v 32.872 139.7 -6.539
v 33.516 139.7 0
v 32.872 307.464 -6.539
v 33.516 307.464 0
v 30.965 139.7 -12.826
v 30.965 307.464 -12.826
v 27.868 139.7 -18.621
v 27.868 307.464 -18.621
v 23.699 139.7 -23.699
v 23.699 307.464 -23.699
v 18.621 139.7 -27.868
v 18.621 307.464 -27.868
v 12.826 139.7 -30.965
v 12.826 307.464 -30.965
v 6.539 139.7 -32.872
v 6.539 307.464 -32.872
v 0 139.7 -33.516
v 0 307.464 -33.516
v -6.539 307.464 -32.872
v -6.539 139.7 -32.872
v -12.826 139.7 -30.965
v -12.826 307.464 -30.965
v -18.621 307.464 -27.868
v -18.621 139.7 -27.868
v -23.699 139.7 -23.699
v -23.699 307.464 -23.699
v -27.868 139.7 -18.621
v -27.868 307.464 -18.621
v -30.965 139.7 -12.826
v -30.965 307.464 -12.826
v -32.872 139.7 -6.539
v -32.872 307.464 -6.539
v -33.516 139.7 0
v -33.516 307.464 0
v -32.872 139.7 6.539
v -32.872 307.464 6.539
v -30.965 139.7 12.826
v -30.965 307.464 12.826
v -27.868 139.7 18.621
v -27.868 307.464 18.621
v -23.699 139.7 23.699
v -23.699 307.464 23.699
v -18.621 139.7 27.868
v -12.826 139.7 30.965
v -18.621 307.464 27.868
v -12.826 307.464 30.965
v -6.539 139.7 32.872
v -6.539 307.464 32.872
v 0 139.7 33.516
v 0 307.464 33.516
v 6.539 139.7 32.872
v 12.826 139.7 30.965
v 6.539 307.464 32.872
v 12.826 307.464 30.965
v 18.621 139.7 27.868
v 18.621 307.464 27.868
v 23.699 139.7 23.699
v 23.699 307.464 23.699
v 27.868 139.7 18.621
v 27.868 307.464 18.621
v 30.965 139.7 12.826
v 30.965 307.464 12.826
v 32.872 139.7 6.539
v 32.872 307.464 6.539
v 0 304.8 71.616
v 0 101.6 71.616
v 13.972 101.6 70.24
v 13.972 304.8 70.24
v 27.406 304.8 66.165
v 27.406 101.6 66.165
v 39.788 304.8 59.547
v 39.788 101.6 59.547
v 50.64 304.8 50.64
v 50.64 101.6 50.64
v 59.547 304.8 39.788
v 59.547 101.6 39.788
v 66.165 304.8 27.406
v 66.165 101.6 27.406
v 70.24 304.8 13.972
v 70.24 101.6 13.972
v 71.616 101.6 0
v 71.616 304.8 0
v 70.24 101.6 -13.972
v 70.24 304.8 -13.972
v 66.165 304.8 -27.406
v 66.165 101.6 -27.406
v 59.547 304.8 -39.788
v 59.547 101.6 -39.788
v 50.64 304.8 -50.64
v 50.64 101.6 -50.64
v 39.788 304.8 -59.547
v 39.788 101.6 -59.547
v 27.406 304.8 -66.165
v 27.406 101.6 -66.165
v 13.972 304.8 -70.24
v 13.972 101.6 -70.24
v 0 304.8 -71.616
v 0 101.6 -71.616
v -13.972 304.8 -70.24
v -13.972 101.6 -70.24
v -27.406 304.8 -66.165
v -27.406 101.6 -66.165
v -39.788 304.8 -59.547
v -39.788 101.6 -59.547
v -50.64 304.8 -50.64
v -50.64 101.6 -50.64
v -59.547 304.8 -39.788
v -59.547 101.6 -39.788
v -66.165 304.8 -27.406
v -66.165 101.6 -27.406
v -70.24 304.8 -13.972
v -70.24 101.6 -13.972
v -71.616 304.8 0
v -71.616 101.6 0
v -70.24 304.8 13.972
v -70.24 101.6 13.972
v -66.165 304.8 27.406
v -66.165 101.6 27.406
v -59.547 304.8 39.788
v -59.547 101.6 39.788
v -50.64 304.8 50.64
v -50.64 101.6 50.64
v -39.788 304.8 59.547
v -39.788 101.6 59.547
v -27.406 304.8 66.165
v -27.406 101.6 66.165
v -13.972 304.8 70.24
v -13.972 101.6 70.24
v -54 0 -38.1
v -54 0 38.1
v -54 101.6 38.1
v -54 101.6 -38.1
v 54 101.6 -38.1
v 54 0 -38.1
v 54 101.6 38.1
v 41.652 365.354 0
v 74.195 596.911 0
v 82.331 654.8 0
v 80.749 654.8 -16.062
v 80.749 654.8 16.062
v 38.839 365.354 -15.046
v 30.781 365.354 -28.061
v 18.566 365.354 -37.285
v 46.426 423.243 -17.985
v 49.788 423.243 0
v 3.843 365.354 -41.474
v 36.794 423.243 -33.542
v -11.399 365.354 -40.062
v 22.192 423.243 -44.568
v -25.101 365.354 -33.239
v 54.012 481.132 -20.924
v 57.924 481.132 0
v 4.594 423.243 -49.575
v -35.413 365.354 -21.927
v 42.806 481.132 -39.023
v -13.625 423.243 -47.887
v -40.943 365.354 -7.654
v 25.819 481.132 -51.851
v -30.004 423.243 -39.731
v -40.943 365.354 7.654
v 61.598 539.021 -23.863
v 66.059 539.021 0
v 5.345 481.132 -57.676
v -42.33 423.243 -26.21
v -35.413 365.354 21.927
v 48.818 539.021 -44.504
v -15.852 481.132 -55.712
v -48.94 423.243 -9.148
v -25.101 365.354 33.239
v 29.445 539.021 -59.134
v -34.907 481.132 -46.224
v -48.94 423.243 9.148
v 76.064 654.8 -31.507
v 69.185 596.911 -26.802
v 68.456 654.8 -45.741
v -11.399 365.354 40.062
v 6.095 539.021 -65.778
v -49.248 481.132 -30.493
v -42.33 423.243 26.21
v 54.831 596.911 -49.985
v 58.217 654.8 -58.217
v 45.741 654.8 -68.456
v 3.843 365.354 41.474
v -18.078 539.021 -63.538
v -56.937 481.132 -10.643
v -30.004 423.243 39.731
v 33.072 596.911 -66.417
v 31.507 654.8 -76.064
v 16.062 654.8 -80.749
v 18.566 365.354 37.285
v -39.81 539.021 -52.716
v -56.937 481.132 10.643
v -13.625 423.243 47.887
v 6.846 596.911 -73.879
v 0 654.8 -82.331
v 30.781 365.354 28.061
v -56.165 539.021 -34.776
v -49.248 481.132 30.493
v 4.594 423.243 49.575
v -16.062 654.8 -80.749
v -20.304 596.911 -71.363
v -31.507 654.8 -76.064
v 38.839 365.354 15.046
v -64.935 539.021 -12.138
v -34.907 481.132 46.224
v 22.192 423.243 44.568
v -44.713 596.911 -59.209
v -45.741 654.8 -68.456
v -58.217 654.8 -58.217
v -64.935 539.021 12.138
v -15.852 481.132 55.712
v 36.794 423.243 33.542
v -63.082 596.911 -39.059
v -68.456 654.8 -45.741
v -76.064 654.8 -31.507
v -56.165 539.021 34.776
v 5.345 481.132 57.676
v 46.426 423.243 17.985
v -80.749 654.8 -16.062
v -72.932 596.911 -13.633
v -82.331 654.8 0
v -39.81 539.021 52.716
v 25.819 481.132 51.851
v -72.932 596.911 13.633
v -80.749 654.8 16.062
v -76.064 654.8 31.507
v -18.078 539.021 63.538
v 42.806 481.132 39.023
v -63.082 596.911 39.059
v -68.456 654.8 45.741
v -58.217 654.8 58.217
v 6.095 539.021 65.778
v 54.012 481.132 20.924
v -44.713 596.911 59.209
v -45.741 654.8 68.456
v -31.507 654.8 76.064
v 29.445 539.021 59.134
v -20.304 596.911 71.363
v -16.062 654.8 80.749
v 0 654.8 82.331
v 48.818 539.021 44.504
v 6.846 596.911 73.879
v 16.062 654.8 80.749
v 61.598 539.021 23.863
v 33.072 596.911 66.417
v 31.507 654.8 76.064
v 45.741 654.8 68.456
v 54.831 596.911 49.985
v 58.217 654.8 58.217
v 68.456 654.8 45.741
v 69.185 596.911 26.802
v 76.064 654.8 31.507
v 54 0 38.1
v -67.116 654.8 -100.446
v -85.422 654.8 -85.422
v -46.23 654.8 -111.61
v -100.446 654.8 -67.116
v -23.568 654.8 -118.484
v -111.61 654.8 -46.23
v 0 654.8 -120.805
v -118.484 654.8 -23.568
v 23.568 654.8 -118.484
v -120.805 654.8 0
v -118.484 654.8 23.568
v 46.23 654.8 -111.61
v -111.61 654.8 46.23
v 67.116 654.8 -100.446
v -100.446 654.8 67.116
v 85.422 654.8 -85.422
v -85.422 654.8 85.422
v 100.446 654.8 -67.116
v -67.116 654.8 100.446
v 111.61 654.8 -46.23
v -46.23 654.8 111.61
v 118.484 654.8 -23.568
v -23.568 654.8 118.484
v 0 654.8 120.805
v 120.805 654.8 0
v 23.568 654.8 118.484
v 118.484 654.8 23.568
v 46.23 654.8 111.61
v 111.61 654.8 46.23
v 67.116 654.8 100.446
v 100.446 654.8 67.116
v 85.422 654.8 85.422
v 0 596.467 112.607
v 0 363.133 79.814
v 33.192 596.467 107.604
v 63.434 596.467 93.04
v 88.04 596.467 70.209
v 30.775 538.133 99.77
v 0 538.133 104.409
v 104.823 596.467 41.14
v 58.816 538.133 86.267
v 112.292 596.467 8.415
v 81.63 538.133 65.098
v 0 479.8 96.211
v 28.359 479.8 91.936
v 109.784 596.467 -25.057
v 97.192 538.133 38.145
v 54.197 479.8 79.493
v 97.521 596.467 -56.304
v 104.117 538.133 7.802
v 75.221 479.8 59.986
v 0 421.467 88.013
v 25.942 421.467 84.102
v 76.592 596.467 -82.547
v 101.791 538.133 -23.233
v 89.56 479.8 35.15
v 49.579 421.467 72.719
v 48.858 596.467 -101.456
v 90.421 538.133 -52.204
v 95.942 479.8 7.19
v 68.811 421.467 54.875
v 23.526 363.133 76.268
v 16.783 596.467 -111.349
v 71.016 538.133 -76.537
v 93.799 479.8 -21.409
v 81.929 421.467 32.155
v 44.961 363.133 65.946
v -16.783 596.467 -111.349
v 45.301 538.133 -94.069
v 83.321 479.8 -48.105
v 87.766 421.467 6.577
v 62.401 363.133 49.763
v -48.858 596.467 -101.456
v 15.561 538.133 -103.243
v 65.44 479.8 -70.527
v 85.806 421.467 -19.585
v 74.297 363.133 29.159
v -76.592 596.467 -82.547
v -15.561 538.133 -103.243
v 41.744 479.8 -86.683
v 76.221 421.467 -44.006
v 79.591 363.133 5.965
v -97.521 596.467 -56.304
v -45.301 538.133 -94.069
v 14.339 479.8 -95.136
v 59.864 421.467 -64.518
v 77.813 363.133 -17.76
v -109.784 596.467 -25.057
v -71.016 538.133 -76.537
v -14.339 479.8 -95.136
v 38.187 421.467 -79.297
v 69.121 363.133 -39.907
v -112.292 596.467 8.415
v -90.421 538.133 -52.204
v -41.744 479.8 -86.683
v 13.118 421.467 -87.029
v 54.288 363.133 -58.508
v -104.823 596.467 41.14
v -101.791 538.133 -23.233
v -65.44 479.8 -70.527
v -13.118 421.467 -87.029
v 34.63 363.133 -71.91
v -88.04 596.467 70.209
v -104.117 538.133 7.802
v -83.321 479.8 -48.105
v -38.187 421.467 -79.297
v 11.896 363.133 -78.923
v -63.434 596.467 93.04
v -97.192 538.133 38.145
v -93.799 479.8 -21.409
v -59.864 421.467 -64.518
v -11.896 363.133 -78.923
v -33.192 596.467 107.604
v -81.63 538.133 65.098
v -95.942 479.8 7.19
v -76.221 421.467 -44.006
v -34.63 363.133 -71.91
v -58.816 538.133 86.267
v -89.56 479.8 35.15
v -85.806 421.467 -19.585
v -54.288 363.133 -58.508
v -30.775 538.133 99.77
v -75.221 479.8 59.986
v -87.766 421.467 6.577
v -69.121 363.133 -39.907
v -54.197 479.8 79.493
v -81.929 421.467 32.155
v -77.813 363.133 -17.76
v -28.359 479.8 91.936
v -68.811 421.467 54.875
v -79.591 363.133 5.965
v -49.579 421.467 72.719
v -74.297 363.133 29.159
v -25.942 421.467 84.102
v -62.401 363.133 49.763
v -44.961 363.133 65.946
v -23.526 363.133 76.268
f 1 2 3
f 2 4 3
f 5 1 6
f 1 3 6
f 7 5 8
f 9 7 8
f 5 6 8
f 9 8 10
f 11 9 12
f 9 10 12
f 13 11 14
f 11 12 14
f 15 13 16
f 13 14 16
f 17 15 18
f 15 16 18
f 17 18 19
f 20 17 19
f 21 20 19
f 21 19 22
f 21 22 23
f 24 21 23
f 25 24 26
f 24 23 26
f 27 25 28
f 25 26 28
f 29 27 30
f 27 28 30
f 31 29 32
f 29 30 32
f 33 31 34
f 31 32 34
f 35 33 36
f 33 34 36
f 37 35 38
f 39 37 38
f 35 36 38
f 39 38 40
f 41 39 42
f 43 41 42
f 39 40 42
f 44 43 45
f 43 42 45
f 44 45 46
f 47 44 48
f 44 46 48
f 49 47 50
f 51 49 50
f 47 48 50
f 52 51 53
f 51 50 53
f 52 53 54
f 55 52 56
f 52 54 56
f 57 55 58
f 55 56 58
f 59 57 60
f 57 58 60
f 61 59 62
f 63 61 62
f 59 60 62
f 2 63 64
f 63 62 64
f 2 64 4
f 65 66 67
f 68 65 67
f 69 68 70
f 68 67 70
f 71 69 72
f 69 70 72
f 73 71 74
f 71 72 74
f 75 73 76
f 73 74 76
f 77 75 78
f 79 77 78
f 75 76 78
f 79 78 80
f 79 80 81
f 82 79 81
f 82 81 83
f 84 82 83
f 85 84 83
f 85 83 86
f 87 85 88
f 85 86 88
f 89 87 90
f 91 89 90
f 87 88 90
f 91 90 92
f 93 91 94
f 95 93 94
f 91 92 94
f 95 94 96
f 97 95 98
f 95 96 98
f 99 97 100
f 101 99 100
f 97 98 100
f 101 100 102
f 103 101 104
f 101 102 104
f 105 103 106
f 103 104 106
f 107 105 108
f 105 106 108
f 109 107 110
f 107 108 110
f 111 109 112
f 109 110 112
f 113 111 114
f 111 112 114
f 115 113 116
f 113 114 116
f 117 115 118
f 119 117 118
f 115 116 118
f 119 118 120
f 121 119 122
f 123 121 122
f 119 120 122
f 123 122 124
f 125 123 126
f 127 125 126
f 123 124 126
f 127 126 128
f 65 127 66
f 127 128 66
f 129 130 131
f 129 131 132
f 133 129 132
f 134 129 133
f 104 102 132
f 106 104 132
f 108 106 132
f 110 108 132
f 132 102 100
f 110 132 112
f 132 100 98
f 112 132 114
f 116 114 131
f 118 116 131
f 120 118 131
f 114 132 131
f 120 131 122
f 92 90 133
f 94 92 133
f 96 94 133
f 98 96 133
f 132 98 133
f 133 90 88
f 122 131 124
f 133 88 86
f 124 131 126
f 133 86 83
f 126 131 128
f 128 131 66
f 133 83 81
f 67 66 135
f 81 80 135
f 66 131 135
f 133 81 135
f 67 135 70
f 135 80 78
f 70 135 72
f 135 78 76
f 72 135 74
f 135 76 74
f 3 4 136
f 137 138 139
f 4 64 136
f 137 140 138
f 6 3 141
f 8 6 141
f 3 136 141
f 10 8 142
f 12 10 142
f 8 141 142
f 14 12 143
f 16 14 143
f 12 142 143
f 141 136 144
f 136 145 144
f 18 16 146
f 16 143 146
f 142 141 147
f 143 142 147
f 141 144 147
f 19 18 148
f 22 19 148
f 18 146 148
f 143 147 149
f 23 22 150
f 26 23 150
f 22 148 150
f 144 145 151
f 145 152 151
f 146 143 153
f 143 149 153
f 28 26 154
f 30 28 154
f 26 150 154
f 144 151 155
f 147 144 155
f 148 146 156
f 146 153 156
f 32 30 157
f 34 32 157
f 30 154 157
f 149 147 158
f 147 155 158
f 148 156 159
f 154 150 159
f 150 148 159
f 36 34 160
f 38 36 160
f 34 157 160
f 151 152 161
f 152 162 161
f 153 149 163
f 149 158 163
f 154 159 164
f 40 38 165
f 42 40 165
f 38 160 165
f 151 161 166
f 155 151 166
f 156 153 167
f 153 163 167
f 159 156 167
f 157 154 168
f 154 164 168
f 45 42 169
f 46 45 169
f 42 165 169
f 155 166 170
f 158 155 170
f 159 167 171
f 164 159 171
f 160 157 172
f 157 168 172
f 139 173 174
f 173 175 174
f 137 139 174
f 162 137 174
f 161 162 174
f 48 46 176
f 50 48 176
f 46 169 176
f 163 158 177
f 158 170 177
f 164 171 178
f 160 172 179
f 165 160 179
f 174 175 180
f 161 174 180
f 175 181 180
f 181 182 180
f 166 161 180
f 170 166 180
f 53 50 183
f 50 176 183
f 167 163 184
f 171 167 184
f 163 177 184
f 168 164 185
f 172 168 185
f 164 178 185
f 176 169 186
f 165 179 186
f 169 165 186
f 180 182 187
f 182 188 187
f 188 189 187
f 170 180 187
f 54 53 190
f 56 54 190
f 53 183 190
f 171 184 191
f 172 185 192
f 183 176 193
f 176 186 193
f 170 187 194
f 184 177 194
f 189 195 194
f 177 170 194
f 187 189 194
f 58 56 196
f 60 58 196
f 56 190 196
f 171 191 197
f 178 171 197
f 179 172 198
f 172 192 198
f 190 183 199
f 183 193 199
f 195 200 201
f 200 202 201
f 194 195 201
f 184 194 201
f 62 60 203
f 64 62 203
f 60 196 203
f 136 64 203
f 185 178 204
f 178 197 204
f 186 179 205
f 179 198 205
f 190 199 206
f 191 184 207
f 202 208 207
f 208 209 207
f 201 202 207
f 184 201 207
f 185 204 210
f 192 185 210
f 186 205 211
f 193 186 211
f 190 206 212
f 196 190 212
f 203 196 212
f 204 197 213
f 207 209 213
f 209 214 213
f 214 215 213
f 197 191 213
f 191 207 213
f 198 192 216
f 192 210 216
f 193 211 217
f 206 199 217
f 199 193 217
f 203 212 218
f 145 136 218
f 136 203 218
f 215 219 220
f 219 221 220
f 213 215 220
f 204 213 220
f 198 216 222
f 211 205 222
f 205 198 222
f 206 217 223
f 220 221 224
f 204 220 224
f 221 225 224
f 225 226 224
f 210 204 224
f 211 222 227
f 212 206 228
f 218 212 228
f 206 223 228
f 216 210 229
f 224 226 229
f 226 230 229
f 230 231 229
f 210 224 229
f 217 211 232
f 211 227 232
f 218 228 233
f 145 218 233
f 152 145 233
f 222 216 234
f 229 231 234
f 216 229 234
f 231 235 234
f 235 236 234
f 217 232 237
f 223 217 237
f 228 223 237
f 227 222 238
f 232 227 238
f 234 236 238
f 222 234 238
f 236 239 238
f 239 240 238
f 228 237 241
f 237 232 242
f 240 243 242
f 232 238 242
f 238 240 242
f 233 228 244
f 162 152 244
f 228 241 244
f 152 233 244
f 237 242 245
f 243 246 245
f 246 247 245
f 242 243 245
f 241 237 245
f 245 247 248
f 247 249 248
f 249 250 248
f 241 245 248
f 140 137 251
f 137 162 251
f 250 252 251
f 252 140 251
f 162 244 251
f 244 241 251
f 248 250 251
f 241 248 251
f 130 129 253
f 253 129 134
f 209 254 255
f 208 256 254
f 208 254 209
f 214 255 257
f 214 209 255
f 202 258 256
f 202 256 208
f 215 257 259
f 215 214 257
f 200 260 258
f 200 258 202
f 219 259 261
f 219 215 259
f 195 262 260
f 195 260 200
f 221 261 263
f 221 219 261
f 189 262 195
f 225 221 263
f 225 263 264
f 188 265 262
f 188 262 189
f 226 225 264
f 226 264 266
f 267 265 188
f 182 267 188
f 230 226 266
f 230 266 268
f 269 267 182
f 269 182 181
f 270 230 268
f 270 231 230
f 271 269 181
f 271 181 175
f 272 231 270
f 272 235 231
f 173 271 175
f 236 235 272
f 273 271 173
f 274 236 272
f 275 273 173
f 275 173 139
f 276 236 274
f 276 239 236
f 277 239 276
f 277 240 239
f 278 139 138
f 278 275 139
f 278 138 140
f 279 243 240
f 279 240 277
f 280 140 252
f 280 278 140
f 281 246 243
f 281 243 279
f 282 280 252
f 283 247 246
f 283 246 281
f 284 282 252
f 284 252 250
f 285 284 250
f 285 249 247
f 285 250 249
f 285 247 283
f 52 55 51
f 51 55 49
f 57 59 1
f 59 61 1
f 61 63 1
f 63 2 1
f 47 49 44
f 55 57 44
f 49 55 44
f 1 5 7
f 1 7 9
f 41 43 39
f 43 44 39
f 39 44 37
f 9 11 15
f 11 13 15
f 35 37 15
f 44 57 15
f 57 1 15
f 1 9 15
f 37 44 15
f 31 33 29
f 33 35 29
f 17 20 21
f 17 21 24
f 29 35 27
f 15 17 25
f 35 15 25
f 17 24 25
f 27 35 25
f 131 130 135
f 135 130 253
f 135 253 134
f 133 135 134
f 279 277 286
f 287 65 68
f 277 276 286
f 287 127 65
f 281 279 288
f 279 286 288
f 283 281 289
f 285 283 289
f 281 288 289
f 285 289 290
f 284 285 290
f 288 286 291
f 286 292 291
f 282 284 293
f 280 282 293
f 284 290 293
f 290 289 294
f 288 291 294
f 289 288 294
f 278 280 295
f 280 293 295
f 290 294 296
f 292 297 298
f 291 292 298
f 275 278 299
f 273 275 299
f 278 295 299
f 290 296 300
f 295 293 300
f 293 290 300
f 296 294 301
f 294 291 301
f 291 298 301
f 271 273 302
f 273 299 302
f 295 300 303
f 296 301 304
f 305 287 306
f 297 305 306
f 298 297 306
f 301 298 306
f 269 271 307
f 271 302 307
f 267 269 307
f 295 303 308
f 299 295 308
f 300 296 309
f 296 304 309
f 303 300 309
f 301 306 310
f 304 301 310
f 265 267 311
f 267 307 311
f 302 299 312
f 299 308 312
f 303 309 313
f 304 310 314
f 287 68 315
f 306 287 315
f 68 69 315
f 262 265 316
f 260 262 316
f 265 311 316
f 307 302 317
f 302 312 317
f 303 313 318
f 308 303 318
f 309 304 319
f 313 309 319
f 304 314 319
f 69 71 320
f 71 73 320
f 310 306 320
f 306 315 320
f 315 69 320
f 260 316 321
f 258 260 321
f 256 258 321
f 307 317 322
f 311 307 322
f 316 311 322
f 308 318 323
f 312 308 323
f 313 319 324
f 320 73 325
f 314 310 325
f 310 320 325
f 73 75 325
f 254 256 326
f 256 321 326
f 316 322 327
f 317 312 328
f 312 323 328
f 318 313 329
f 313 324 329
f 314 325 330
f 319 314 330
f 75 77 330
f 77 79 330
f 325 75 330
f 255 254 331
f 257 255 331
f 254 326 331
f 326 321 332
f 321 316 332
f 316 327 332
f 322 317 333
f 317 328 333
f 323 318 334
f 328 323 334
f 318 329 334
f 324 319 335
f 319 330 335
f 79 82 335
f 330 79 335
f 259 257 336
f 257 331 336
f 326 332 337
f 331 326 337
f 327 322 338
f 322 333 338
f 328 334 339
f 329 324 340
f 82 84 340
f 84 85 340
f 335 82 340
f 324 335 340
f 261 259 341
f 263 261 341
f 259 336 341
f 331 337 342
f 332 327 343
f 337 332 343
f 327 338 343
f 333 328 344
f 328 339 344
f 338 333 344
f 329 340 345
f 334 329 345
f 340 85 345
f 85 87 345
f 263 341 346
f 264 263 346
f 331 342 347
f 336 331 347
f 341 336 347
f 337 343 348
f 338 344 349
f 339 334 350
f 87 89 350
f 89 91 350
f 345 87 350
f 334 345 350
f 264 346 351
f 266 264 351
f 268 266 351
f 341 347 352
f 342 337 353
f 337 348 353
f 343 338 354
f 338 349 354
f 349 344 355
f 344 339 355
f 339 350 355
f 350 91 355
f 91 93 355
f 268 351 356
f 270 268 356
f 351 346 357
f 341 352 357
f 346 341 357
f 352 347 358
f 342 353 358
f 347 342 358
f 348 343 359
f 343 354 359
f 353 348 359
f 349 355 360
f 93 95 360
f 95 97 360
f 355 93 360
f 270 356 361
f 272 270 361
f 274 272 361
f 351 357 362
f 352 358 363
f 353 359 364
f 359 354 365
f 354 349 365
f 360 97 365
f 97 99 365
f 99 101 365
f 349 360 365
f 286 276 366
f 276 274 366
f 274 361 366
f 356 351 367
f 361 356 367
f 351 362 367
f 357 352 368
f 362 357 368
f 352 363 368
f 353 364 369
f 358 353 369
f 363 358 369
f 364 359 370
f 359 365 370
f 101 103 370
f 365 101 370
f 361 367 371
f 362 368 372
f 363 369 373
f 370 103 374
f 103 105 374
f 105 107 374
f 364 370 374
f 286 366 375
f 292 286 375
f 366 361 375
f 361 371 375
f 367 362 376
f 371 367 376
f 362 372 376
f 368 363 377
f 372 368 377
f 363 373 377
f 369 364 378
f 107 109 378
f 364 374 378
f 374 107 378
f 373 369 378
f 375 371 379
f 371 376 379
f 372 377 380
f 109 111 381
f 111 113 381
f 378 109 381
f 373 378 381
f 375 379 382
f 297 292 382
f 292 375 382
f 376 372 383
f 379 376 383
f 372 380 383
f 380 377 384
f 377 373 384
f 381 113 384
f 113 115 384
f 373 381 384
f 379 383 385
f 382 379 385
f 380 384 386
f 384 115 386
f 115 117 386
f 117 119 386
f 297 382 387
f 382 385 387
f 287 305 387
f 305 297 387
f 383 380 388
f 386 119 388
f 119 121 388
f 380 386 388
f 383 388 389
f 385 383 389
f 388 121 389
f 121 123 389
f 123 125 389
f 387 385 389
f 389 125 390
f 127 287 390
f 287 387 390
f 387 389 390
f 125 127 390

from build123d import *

# Parameters (mm, degrees)
SKETCH1_W           = 108
SKETCH1_H           = 76.2
BOSS_EXTRUDE1_DEPTH = 101.6
SKETCH2_R           = 71.616075106
BOSS_EXTRUDE2_DEPTH = 203.2
SKETCH4_R           = 71.616075106
BOSS_EXTRUDE3_DEPTH = 350
BOSS_EXTRUDE3_DRAFT = -8


# Read off the part's stored shape, not the designer's step: Shell1
with BuildPart() as part:
    # Sketch1 → Boss-Extrude1 (new body)
    with BuildSketch(Plane(origin=(0, 0, 0), x_dir=(1, 0, 0), z_dir=(0, 1, 0))):
        Rectangle(SKETCH1_W, SKETCH1_H)
    extrude(amount=BOSS_EXTRUDE1_DEPTH)

    # Sketch2 → Boss-Extrude2 (add)
    with BuildSketch(Plane(origin=(0, 101.6, 0), x_dir=(1, 0, 0), z_dir=(0, 1, 0))):
        with Locations(Location((0, 0, 0), (0, 0, 270))):
            Circle(SKETCH2_R)
    extrude(amount=BOSS_EXTRUDE2_DEPTH)


with BuildPart() as boss_extrude3_tool:
    # Sketch4 → Boss-Extrude3 (with draft: the straight prism first)
    with BuildSketch(Plane(origin=(0, 304.8, 0), x_dir=(1, 0, 0), z_dir=(0, 1, 0))):
        with Locations(Location((0, 0, 0), (0, 0, 270))):
            Circle(SKETCH4_R)
    extrude(amount=BOSS_EXTRUDE3_DEPTH)
    # Boss-Extrude3: the draft: its side faces are tilted about the plane it starts from
    boss_extrude3_sides = [boss_extrude3_tool.faces().sort_by_distance(p)[0] for p in [
        (0, 479.8, -71.616075106),
    ]]
    draft(boss_extrude3_sides, Plane(origin=(0, 304.8, 0), x_dir=(1, 0, 0), z_dir=(0, 1, 0)), BOSS_EXTRUDE3_DRAFT)


with BuildPart() as part_1:
    add(part.part)

    # Boss-Extrude3: add boss_extrude3_tool
    add(boss_extrude3_tool.part)

    # Shell1 outline → Shell1 (revolve, cut)
    with BuildSketch(Plane.XY):
        Polygon((0, 654.8), (0, 139.7), (33.516075106, 139.7), (33.516075106, 307.464211535), (82.330936739, 654.8), align=None)
    revolve(axis=Axis((0, 0, 0), (0, 1, 0)), mode=Mode.SUBTRACT)


solid = part_1.part
